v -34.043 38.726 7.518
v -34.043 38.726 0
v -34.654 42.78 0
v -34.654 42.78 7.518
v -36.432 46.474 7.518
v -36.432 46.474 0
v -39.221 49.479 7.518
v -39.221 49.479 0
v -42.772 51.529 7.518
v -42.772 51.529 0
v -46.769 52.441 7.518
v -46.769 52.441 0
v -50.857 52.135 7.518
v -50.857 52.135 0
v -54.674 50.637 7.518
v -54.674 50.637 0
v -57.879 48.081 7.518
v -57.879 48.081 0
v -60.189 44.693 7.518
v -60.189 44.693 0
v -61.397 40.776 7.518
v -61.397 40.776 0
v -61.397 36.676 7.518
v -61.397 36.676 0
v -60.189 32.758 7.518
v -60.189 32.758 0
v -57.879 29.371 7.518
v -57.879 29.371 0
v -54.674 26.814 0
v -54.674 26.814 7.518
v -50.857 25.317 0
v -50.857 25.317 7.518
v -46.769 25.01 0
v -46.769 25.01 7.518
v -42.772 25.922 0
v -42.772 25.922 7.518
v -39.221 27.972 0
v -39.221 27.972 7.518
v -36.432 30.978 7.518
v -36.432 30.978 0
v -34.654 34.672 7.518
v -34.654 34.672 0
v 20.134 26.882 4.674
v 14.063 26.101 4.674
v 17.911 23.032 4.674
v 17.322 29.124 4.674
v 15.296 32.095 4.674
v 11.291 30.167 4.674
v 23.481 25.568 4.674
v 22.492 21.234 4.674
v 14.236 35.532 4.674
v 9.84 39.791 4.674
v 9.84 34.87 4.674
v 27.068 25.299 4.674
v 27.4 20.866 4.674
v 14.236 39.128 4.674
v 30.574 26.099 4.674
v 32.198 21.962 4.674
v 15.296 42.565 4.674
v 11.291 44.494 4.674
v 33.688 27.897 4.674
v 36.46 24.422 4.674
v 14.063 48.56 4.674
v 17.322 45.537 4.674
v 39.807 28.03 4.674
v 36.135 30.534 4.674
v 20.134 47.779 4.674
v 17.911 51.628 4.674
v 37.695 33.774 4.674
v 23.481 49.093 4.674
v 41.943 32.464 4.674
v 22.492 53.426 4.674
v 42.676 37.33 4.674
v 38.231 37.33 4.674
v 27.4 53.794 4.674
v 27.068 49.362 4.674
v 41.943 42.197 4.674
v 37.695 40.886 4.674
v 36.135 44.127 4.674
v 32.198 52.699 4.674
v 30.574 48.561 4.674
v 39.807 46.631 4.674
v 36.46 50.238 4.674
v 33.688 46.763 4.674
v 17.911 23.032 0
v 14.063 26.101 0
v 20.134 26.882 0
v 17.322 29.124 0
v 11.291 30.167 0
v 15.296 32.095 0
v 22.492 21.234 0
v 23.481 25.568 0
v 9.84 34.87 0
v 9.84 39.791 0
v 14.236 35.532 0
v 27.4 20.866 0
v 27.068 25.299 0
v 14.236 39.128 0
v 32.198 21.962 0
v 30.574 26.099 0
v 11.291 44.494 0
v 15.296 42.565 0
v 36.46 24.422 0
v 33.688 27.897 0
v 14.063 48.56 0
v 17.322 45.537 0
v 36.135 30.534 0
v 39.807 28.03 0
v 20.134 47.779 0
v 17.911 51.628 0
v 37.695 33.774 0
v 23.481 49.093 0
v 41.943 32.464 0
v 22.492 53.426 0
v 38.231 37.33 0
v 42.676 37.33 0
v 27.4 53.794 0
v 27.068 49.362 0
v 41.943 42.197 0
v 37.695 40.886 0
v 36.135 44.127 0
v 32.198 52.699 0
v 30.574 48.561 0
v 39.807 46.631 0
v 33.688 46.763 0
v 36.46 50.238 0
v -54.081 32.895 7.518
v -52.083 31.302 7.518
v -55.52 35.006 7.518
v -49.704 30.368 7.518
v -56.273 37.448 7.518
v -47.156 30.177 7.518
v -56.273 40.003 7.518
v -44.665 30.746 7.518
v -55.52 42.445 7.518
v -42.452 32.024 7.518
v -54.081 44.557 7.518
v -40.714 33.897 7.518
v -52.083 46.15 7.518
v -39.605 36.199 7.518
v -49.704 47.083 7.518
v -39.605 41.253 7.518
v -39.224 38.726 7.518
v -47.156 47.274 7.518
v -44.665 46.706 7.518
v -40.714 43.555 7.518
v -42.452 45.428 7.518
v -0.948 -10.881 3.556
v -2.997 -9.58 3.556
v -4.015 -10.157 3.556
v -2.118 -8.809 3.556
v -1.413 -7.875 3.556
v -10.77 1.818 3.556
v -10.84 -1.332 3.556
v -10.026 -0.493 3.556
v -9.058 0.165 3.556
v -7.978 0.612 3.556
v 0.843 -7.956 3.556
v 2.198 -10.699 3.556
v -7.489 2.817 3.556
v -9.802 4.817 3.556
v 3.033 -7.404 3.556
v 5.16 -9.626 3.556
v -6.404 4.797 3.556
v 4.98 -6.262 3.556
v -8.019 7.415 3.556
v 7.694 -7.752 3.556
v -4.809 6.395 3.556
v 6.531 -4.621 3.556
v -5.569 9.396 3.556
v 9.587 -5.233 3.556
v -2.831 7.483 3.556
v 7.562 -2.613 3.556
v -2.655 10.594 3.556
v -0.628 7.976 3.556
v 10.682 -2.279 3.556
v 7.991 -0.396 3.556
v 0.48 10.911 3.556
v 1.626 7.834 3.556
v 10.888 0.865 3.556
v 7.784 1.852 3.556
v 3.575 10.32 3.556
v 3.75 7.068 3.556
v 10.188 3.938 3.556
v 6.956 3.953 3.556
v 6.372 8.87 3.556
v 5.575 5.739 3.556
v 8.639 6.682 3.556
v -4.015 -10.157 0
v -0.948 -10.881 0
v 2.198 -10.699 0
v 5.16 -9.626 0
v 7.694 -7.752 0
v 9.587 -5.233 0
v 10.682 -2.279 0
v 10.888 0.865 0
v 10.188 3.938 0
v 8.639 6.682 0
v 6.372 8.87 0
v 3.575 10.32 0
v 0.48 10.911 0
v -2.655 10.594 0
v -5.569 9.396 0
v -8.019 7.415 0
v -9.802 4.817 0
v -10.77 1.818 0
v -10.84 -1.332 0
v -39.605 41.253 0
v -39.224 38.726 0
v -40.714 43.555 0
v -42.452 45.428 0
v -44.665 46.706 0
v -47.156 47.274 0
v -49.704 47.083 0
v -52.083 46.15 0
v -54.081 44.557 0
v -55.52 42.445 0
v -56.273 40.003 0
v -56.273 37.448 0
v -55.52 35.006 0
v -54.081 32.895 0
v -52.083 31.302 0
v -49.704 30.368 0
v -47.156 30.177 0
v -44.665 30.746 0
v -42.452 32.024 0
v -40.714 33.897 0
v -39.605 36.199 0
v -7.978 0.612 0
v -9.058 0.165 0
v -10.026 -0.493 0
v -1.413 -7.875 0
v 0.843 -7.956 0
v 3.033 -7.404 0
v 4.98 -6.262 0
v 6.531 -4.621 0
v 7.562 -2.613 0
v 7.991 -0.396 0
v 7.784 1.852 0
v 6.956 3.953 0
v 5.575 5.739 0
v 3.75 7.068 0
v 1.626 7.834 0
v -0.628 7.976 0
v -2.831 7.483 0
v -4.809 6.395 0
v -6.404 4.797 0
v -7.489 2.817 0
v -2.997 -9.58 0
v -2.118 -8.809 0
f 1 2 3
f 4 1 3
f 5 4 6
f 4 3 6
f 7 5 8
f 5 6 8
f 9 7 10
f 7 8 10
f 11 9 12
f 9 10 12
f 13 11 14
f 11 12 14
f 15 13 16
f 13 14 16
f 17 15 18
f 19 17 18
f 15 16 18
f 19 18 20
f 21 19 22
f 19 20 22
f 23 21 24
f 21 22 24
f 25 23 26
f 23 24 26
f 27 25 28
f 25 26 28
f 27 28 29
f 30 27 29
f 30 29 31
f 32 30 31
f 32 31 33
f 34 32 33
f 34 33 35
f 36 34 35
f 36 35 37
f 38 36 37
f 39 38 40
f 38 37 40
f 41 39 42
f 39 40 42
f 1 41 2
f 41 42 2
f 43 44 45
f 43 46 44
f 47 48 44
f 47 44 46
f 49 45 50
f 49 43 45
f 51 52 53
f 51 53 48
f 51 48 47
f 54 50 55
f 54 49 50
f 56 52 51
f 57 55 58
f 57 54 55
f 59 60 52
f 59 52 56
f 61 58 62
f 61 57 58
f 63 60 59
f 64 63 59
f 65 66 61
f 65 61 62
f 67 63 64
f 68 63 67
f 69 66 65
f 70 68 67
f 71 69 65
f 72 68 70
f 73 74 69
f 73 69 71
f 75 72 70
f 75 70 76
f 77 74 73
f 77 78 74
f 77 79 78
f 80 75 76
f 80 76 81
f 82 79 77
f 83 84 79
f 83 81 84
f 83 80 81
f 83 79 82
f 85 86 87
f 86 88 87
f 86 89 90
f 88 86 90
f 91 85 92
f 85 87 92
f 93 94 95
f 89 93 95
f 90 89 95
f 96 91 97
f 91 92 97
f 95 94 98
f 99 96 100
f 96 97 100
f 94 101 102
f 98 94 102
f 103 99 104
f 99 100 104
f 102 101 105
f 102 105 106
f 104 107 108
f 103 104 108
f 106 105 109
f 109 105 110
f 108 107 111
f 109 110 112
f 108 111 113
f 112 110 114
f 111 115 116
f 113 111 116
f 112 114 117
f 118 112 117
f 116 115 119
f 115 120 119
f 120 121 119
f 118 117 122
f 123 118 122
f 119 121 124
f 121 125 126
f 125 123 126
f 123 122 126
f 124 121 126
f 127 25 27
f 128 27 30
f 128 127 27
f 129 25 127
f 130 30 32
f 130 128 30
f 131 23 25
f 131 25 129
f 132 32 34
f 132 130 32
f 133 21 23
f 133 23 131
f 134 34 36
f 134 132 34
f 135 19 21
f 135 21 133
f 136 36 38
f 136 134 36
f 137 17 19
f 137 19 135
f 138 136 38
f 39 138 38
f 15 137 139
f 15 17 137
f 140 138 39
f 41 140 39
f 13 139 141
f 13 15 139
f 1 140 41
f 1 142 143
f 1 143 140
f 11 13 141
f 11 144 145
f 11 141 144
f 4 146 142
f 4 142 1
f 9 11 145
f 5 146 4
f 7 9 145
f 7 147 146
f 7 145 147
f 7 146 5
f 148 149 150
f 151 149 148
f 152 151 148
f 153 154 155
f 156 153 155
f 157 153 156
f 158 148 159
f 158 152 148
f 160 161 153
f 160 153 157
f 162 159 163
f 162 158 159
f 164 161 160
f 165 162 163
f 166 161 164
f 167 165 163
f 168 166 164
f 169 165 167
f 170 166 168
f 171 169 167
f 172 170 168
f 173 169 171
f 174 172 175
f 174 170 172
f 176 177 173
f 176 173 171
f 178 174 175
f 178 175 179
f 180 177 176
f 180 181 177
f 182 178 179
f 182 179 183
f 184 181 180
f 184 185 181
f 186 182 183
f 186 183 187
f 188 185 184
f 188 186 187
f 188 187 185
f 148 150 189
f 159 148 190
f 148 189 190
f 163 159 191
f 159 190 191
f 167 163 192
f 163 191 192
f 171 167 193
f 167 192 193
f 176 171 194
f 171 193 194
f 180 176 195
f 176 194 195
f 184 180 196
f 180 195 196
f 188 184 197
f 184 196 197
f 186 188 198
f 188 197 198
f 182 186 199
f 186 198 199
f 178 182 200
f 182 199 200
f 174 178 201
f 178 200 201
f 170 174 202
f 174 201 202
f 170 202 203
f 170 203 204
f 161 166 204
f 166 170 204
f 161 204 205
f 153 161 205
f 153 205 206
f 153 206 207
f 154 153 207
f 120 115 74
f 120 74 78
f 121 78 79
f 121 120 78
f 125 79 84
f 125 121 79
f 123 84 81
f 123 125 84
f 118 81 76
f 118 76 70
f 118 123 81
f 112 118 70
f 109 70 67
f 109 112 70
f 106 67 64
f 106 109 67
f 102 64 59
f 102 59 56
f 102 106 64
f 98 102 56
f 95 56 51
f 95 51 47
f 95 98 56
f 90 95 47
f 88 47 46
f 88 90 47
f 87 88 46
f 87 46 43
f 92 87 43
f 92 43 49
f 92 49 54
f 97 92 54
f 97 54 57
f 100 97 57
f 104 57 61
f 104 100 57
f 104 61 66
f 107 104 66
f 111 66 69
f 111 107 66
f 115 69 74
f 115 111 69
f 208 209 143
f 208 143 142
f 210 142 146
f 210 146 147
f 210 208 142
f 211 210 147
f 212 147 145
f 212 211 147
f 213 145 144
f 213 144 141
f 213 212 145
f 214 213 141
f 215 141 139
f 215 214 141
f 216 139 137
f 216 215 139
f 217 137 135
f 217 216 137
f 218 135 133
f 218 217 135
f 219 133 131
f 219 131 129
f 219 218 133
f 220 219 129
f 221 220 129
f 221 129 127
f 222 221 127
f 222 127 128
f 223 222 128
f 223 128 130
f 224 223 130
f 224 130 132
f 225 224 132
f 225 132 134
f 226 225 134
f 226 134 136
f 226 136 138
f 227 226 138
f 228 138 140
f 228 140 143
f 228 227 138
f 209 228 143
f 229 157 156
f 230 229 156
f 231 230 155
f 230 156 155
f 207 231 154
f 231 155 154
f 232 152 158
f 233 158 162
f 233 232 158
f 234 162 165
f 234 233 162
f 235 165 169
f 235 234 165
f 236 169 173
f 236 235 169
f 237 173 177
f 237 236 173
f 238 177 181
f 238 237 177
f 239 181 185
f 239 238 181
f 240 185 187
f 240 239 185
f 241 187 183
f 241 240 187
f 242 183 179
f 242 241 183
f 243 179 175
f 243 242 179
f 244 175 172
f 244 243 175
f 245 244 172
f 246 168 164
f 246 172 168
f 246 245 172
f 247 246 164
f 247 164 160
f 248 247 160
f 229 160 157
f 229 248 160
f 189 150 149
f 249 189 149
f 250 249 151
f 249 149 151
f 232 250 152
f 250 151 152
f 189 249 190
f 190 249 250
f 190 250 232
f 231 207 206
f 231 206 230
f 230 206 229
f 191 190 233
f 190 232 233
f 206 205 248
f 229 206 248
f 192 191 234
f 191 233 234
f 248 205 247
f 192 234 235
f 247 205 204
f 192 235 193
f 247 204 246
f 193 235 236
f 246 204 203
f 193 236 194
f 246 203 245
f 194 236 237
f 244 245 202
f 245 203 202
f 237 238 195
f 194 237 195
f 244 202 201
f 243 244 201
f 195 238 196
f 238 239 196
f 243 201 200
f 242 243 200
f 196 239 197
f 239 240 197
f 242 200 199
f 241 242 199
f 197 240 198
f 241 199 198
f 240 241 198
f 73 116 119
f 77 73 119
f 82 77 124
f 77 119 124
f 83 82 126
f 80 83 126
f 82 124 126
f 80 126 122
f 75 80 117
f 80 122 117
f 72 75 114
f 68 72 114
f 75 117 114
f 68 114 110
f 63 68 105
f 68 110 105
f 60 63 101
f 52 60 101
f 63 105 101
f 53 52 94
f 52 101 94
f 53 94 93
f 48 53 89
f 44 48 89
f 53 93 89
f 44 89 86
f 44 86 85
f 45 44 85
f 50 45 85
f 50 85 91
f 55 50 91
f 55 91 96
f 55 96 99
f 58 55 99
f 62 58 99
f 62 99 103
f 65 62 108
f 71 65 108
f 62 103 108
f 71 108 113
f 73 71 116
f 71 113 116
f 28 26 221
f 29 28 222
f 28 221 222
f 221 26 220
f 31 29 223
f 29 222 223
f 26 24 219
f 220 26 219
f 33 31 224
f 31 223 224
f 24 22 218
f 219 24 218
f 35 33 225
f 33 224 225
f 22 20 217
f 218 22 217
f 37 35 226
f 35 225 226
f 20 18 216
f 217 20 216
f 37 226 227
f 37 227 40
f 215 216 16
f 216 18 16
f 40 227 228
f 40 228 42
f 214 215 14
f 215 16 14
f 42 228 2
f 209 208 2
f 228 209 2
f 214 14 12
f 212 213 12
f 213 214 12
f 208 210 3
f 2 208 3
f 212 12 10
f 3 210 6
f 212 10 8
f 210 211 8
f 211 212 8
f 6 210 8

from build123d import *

# Parameters (mm, degrees)
F0_R     = 10.922
F0_R_2   = 8.001
F1_DEPTH = 3.556
F2_R     = 5.748721
F3_DEPTH = 4.699
F4_R     = 13.7541
F4_R_2   = 8.5725
F5_DEPTH = 7.5184
F6_R     = 16.51
F6_R_2   = 12.065
F7_DEPTH = 4.6736


with BuildPart() as f1:
    # F0 (on Top) → F1 (new body)
    with BuildSketch(Plane.XY):
        Circle(F0_R)
        Circle(F0_R_2, mode=Mode.SUBTRACT)
    extrude(amount=F1_DEPTH)

    # F2 (on face) → F3 (cut)
    with BuildSketch(Plane.XY.offset(3.556)):
        with Locations((-6.328924, -4.894968)):
            Circle(F2_R)
    extrude(amount=-F3_DEPTH, mode=Mode.SUBTRACT)


with BuildPart() as f5:
    # F4 (on Top) → F5 (new body)
    with BuildSketch(Plane.XY):
        with Locations((-47.79667, 38.725771)):
            Circle(F4_R)
        with Locations((-47.79667, 38.725771)):
            Circle(F4_R_2, mode=Mode.SUBTRACT)
    extrude(amount=F5_DEPTH)


with BuildPart() as f7:
    # F6 (on Top) → F7 (new body)
    with BuildSketch(Plane.XY):
        with Locations((26.166059, 37.330247)):
            Circle(F6_R)
        with Locations((26.166059, 37.330247)):
            Circle(F6_R_2, mode=Mode.SUBTRACT)
    extrude(amount=F7_DEPTH)


solid = Compound([f1.part, f5.part, f7.part])
